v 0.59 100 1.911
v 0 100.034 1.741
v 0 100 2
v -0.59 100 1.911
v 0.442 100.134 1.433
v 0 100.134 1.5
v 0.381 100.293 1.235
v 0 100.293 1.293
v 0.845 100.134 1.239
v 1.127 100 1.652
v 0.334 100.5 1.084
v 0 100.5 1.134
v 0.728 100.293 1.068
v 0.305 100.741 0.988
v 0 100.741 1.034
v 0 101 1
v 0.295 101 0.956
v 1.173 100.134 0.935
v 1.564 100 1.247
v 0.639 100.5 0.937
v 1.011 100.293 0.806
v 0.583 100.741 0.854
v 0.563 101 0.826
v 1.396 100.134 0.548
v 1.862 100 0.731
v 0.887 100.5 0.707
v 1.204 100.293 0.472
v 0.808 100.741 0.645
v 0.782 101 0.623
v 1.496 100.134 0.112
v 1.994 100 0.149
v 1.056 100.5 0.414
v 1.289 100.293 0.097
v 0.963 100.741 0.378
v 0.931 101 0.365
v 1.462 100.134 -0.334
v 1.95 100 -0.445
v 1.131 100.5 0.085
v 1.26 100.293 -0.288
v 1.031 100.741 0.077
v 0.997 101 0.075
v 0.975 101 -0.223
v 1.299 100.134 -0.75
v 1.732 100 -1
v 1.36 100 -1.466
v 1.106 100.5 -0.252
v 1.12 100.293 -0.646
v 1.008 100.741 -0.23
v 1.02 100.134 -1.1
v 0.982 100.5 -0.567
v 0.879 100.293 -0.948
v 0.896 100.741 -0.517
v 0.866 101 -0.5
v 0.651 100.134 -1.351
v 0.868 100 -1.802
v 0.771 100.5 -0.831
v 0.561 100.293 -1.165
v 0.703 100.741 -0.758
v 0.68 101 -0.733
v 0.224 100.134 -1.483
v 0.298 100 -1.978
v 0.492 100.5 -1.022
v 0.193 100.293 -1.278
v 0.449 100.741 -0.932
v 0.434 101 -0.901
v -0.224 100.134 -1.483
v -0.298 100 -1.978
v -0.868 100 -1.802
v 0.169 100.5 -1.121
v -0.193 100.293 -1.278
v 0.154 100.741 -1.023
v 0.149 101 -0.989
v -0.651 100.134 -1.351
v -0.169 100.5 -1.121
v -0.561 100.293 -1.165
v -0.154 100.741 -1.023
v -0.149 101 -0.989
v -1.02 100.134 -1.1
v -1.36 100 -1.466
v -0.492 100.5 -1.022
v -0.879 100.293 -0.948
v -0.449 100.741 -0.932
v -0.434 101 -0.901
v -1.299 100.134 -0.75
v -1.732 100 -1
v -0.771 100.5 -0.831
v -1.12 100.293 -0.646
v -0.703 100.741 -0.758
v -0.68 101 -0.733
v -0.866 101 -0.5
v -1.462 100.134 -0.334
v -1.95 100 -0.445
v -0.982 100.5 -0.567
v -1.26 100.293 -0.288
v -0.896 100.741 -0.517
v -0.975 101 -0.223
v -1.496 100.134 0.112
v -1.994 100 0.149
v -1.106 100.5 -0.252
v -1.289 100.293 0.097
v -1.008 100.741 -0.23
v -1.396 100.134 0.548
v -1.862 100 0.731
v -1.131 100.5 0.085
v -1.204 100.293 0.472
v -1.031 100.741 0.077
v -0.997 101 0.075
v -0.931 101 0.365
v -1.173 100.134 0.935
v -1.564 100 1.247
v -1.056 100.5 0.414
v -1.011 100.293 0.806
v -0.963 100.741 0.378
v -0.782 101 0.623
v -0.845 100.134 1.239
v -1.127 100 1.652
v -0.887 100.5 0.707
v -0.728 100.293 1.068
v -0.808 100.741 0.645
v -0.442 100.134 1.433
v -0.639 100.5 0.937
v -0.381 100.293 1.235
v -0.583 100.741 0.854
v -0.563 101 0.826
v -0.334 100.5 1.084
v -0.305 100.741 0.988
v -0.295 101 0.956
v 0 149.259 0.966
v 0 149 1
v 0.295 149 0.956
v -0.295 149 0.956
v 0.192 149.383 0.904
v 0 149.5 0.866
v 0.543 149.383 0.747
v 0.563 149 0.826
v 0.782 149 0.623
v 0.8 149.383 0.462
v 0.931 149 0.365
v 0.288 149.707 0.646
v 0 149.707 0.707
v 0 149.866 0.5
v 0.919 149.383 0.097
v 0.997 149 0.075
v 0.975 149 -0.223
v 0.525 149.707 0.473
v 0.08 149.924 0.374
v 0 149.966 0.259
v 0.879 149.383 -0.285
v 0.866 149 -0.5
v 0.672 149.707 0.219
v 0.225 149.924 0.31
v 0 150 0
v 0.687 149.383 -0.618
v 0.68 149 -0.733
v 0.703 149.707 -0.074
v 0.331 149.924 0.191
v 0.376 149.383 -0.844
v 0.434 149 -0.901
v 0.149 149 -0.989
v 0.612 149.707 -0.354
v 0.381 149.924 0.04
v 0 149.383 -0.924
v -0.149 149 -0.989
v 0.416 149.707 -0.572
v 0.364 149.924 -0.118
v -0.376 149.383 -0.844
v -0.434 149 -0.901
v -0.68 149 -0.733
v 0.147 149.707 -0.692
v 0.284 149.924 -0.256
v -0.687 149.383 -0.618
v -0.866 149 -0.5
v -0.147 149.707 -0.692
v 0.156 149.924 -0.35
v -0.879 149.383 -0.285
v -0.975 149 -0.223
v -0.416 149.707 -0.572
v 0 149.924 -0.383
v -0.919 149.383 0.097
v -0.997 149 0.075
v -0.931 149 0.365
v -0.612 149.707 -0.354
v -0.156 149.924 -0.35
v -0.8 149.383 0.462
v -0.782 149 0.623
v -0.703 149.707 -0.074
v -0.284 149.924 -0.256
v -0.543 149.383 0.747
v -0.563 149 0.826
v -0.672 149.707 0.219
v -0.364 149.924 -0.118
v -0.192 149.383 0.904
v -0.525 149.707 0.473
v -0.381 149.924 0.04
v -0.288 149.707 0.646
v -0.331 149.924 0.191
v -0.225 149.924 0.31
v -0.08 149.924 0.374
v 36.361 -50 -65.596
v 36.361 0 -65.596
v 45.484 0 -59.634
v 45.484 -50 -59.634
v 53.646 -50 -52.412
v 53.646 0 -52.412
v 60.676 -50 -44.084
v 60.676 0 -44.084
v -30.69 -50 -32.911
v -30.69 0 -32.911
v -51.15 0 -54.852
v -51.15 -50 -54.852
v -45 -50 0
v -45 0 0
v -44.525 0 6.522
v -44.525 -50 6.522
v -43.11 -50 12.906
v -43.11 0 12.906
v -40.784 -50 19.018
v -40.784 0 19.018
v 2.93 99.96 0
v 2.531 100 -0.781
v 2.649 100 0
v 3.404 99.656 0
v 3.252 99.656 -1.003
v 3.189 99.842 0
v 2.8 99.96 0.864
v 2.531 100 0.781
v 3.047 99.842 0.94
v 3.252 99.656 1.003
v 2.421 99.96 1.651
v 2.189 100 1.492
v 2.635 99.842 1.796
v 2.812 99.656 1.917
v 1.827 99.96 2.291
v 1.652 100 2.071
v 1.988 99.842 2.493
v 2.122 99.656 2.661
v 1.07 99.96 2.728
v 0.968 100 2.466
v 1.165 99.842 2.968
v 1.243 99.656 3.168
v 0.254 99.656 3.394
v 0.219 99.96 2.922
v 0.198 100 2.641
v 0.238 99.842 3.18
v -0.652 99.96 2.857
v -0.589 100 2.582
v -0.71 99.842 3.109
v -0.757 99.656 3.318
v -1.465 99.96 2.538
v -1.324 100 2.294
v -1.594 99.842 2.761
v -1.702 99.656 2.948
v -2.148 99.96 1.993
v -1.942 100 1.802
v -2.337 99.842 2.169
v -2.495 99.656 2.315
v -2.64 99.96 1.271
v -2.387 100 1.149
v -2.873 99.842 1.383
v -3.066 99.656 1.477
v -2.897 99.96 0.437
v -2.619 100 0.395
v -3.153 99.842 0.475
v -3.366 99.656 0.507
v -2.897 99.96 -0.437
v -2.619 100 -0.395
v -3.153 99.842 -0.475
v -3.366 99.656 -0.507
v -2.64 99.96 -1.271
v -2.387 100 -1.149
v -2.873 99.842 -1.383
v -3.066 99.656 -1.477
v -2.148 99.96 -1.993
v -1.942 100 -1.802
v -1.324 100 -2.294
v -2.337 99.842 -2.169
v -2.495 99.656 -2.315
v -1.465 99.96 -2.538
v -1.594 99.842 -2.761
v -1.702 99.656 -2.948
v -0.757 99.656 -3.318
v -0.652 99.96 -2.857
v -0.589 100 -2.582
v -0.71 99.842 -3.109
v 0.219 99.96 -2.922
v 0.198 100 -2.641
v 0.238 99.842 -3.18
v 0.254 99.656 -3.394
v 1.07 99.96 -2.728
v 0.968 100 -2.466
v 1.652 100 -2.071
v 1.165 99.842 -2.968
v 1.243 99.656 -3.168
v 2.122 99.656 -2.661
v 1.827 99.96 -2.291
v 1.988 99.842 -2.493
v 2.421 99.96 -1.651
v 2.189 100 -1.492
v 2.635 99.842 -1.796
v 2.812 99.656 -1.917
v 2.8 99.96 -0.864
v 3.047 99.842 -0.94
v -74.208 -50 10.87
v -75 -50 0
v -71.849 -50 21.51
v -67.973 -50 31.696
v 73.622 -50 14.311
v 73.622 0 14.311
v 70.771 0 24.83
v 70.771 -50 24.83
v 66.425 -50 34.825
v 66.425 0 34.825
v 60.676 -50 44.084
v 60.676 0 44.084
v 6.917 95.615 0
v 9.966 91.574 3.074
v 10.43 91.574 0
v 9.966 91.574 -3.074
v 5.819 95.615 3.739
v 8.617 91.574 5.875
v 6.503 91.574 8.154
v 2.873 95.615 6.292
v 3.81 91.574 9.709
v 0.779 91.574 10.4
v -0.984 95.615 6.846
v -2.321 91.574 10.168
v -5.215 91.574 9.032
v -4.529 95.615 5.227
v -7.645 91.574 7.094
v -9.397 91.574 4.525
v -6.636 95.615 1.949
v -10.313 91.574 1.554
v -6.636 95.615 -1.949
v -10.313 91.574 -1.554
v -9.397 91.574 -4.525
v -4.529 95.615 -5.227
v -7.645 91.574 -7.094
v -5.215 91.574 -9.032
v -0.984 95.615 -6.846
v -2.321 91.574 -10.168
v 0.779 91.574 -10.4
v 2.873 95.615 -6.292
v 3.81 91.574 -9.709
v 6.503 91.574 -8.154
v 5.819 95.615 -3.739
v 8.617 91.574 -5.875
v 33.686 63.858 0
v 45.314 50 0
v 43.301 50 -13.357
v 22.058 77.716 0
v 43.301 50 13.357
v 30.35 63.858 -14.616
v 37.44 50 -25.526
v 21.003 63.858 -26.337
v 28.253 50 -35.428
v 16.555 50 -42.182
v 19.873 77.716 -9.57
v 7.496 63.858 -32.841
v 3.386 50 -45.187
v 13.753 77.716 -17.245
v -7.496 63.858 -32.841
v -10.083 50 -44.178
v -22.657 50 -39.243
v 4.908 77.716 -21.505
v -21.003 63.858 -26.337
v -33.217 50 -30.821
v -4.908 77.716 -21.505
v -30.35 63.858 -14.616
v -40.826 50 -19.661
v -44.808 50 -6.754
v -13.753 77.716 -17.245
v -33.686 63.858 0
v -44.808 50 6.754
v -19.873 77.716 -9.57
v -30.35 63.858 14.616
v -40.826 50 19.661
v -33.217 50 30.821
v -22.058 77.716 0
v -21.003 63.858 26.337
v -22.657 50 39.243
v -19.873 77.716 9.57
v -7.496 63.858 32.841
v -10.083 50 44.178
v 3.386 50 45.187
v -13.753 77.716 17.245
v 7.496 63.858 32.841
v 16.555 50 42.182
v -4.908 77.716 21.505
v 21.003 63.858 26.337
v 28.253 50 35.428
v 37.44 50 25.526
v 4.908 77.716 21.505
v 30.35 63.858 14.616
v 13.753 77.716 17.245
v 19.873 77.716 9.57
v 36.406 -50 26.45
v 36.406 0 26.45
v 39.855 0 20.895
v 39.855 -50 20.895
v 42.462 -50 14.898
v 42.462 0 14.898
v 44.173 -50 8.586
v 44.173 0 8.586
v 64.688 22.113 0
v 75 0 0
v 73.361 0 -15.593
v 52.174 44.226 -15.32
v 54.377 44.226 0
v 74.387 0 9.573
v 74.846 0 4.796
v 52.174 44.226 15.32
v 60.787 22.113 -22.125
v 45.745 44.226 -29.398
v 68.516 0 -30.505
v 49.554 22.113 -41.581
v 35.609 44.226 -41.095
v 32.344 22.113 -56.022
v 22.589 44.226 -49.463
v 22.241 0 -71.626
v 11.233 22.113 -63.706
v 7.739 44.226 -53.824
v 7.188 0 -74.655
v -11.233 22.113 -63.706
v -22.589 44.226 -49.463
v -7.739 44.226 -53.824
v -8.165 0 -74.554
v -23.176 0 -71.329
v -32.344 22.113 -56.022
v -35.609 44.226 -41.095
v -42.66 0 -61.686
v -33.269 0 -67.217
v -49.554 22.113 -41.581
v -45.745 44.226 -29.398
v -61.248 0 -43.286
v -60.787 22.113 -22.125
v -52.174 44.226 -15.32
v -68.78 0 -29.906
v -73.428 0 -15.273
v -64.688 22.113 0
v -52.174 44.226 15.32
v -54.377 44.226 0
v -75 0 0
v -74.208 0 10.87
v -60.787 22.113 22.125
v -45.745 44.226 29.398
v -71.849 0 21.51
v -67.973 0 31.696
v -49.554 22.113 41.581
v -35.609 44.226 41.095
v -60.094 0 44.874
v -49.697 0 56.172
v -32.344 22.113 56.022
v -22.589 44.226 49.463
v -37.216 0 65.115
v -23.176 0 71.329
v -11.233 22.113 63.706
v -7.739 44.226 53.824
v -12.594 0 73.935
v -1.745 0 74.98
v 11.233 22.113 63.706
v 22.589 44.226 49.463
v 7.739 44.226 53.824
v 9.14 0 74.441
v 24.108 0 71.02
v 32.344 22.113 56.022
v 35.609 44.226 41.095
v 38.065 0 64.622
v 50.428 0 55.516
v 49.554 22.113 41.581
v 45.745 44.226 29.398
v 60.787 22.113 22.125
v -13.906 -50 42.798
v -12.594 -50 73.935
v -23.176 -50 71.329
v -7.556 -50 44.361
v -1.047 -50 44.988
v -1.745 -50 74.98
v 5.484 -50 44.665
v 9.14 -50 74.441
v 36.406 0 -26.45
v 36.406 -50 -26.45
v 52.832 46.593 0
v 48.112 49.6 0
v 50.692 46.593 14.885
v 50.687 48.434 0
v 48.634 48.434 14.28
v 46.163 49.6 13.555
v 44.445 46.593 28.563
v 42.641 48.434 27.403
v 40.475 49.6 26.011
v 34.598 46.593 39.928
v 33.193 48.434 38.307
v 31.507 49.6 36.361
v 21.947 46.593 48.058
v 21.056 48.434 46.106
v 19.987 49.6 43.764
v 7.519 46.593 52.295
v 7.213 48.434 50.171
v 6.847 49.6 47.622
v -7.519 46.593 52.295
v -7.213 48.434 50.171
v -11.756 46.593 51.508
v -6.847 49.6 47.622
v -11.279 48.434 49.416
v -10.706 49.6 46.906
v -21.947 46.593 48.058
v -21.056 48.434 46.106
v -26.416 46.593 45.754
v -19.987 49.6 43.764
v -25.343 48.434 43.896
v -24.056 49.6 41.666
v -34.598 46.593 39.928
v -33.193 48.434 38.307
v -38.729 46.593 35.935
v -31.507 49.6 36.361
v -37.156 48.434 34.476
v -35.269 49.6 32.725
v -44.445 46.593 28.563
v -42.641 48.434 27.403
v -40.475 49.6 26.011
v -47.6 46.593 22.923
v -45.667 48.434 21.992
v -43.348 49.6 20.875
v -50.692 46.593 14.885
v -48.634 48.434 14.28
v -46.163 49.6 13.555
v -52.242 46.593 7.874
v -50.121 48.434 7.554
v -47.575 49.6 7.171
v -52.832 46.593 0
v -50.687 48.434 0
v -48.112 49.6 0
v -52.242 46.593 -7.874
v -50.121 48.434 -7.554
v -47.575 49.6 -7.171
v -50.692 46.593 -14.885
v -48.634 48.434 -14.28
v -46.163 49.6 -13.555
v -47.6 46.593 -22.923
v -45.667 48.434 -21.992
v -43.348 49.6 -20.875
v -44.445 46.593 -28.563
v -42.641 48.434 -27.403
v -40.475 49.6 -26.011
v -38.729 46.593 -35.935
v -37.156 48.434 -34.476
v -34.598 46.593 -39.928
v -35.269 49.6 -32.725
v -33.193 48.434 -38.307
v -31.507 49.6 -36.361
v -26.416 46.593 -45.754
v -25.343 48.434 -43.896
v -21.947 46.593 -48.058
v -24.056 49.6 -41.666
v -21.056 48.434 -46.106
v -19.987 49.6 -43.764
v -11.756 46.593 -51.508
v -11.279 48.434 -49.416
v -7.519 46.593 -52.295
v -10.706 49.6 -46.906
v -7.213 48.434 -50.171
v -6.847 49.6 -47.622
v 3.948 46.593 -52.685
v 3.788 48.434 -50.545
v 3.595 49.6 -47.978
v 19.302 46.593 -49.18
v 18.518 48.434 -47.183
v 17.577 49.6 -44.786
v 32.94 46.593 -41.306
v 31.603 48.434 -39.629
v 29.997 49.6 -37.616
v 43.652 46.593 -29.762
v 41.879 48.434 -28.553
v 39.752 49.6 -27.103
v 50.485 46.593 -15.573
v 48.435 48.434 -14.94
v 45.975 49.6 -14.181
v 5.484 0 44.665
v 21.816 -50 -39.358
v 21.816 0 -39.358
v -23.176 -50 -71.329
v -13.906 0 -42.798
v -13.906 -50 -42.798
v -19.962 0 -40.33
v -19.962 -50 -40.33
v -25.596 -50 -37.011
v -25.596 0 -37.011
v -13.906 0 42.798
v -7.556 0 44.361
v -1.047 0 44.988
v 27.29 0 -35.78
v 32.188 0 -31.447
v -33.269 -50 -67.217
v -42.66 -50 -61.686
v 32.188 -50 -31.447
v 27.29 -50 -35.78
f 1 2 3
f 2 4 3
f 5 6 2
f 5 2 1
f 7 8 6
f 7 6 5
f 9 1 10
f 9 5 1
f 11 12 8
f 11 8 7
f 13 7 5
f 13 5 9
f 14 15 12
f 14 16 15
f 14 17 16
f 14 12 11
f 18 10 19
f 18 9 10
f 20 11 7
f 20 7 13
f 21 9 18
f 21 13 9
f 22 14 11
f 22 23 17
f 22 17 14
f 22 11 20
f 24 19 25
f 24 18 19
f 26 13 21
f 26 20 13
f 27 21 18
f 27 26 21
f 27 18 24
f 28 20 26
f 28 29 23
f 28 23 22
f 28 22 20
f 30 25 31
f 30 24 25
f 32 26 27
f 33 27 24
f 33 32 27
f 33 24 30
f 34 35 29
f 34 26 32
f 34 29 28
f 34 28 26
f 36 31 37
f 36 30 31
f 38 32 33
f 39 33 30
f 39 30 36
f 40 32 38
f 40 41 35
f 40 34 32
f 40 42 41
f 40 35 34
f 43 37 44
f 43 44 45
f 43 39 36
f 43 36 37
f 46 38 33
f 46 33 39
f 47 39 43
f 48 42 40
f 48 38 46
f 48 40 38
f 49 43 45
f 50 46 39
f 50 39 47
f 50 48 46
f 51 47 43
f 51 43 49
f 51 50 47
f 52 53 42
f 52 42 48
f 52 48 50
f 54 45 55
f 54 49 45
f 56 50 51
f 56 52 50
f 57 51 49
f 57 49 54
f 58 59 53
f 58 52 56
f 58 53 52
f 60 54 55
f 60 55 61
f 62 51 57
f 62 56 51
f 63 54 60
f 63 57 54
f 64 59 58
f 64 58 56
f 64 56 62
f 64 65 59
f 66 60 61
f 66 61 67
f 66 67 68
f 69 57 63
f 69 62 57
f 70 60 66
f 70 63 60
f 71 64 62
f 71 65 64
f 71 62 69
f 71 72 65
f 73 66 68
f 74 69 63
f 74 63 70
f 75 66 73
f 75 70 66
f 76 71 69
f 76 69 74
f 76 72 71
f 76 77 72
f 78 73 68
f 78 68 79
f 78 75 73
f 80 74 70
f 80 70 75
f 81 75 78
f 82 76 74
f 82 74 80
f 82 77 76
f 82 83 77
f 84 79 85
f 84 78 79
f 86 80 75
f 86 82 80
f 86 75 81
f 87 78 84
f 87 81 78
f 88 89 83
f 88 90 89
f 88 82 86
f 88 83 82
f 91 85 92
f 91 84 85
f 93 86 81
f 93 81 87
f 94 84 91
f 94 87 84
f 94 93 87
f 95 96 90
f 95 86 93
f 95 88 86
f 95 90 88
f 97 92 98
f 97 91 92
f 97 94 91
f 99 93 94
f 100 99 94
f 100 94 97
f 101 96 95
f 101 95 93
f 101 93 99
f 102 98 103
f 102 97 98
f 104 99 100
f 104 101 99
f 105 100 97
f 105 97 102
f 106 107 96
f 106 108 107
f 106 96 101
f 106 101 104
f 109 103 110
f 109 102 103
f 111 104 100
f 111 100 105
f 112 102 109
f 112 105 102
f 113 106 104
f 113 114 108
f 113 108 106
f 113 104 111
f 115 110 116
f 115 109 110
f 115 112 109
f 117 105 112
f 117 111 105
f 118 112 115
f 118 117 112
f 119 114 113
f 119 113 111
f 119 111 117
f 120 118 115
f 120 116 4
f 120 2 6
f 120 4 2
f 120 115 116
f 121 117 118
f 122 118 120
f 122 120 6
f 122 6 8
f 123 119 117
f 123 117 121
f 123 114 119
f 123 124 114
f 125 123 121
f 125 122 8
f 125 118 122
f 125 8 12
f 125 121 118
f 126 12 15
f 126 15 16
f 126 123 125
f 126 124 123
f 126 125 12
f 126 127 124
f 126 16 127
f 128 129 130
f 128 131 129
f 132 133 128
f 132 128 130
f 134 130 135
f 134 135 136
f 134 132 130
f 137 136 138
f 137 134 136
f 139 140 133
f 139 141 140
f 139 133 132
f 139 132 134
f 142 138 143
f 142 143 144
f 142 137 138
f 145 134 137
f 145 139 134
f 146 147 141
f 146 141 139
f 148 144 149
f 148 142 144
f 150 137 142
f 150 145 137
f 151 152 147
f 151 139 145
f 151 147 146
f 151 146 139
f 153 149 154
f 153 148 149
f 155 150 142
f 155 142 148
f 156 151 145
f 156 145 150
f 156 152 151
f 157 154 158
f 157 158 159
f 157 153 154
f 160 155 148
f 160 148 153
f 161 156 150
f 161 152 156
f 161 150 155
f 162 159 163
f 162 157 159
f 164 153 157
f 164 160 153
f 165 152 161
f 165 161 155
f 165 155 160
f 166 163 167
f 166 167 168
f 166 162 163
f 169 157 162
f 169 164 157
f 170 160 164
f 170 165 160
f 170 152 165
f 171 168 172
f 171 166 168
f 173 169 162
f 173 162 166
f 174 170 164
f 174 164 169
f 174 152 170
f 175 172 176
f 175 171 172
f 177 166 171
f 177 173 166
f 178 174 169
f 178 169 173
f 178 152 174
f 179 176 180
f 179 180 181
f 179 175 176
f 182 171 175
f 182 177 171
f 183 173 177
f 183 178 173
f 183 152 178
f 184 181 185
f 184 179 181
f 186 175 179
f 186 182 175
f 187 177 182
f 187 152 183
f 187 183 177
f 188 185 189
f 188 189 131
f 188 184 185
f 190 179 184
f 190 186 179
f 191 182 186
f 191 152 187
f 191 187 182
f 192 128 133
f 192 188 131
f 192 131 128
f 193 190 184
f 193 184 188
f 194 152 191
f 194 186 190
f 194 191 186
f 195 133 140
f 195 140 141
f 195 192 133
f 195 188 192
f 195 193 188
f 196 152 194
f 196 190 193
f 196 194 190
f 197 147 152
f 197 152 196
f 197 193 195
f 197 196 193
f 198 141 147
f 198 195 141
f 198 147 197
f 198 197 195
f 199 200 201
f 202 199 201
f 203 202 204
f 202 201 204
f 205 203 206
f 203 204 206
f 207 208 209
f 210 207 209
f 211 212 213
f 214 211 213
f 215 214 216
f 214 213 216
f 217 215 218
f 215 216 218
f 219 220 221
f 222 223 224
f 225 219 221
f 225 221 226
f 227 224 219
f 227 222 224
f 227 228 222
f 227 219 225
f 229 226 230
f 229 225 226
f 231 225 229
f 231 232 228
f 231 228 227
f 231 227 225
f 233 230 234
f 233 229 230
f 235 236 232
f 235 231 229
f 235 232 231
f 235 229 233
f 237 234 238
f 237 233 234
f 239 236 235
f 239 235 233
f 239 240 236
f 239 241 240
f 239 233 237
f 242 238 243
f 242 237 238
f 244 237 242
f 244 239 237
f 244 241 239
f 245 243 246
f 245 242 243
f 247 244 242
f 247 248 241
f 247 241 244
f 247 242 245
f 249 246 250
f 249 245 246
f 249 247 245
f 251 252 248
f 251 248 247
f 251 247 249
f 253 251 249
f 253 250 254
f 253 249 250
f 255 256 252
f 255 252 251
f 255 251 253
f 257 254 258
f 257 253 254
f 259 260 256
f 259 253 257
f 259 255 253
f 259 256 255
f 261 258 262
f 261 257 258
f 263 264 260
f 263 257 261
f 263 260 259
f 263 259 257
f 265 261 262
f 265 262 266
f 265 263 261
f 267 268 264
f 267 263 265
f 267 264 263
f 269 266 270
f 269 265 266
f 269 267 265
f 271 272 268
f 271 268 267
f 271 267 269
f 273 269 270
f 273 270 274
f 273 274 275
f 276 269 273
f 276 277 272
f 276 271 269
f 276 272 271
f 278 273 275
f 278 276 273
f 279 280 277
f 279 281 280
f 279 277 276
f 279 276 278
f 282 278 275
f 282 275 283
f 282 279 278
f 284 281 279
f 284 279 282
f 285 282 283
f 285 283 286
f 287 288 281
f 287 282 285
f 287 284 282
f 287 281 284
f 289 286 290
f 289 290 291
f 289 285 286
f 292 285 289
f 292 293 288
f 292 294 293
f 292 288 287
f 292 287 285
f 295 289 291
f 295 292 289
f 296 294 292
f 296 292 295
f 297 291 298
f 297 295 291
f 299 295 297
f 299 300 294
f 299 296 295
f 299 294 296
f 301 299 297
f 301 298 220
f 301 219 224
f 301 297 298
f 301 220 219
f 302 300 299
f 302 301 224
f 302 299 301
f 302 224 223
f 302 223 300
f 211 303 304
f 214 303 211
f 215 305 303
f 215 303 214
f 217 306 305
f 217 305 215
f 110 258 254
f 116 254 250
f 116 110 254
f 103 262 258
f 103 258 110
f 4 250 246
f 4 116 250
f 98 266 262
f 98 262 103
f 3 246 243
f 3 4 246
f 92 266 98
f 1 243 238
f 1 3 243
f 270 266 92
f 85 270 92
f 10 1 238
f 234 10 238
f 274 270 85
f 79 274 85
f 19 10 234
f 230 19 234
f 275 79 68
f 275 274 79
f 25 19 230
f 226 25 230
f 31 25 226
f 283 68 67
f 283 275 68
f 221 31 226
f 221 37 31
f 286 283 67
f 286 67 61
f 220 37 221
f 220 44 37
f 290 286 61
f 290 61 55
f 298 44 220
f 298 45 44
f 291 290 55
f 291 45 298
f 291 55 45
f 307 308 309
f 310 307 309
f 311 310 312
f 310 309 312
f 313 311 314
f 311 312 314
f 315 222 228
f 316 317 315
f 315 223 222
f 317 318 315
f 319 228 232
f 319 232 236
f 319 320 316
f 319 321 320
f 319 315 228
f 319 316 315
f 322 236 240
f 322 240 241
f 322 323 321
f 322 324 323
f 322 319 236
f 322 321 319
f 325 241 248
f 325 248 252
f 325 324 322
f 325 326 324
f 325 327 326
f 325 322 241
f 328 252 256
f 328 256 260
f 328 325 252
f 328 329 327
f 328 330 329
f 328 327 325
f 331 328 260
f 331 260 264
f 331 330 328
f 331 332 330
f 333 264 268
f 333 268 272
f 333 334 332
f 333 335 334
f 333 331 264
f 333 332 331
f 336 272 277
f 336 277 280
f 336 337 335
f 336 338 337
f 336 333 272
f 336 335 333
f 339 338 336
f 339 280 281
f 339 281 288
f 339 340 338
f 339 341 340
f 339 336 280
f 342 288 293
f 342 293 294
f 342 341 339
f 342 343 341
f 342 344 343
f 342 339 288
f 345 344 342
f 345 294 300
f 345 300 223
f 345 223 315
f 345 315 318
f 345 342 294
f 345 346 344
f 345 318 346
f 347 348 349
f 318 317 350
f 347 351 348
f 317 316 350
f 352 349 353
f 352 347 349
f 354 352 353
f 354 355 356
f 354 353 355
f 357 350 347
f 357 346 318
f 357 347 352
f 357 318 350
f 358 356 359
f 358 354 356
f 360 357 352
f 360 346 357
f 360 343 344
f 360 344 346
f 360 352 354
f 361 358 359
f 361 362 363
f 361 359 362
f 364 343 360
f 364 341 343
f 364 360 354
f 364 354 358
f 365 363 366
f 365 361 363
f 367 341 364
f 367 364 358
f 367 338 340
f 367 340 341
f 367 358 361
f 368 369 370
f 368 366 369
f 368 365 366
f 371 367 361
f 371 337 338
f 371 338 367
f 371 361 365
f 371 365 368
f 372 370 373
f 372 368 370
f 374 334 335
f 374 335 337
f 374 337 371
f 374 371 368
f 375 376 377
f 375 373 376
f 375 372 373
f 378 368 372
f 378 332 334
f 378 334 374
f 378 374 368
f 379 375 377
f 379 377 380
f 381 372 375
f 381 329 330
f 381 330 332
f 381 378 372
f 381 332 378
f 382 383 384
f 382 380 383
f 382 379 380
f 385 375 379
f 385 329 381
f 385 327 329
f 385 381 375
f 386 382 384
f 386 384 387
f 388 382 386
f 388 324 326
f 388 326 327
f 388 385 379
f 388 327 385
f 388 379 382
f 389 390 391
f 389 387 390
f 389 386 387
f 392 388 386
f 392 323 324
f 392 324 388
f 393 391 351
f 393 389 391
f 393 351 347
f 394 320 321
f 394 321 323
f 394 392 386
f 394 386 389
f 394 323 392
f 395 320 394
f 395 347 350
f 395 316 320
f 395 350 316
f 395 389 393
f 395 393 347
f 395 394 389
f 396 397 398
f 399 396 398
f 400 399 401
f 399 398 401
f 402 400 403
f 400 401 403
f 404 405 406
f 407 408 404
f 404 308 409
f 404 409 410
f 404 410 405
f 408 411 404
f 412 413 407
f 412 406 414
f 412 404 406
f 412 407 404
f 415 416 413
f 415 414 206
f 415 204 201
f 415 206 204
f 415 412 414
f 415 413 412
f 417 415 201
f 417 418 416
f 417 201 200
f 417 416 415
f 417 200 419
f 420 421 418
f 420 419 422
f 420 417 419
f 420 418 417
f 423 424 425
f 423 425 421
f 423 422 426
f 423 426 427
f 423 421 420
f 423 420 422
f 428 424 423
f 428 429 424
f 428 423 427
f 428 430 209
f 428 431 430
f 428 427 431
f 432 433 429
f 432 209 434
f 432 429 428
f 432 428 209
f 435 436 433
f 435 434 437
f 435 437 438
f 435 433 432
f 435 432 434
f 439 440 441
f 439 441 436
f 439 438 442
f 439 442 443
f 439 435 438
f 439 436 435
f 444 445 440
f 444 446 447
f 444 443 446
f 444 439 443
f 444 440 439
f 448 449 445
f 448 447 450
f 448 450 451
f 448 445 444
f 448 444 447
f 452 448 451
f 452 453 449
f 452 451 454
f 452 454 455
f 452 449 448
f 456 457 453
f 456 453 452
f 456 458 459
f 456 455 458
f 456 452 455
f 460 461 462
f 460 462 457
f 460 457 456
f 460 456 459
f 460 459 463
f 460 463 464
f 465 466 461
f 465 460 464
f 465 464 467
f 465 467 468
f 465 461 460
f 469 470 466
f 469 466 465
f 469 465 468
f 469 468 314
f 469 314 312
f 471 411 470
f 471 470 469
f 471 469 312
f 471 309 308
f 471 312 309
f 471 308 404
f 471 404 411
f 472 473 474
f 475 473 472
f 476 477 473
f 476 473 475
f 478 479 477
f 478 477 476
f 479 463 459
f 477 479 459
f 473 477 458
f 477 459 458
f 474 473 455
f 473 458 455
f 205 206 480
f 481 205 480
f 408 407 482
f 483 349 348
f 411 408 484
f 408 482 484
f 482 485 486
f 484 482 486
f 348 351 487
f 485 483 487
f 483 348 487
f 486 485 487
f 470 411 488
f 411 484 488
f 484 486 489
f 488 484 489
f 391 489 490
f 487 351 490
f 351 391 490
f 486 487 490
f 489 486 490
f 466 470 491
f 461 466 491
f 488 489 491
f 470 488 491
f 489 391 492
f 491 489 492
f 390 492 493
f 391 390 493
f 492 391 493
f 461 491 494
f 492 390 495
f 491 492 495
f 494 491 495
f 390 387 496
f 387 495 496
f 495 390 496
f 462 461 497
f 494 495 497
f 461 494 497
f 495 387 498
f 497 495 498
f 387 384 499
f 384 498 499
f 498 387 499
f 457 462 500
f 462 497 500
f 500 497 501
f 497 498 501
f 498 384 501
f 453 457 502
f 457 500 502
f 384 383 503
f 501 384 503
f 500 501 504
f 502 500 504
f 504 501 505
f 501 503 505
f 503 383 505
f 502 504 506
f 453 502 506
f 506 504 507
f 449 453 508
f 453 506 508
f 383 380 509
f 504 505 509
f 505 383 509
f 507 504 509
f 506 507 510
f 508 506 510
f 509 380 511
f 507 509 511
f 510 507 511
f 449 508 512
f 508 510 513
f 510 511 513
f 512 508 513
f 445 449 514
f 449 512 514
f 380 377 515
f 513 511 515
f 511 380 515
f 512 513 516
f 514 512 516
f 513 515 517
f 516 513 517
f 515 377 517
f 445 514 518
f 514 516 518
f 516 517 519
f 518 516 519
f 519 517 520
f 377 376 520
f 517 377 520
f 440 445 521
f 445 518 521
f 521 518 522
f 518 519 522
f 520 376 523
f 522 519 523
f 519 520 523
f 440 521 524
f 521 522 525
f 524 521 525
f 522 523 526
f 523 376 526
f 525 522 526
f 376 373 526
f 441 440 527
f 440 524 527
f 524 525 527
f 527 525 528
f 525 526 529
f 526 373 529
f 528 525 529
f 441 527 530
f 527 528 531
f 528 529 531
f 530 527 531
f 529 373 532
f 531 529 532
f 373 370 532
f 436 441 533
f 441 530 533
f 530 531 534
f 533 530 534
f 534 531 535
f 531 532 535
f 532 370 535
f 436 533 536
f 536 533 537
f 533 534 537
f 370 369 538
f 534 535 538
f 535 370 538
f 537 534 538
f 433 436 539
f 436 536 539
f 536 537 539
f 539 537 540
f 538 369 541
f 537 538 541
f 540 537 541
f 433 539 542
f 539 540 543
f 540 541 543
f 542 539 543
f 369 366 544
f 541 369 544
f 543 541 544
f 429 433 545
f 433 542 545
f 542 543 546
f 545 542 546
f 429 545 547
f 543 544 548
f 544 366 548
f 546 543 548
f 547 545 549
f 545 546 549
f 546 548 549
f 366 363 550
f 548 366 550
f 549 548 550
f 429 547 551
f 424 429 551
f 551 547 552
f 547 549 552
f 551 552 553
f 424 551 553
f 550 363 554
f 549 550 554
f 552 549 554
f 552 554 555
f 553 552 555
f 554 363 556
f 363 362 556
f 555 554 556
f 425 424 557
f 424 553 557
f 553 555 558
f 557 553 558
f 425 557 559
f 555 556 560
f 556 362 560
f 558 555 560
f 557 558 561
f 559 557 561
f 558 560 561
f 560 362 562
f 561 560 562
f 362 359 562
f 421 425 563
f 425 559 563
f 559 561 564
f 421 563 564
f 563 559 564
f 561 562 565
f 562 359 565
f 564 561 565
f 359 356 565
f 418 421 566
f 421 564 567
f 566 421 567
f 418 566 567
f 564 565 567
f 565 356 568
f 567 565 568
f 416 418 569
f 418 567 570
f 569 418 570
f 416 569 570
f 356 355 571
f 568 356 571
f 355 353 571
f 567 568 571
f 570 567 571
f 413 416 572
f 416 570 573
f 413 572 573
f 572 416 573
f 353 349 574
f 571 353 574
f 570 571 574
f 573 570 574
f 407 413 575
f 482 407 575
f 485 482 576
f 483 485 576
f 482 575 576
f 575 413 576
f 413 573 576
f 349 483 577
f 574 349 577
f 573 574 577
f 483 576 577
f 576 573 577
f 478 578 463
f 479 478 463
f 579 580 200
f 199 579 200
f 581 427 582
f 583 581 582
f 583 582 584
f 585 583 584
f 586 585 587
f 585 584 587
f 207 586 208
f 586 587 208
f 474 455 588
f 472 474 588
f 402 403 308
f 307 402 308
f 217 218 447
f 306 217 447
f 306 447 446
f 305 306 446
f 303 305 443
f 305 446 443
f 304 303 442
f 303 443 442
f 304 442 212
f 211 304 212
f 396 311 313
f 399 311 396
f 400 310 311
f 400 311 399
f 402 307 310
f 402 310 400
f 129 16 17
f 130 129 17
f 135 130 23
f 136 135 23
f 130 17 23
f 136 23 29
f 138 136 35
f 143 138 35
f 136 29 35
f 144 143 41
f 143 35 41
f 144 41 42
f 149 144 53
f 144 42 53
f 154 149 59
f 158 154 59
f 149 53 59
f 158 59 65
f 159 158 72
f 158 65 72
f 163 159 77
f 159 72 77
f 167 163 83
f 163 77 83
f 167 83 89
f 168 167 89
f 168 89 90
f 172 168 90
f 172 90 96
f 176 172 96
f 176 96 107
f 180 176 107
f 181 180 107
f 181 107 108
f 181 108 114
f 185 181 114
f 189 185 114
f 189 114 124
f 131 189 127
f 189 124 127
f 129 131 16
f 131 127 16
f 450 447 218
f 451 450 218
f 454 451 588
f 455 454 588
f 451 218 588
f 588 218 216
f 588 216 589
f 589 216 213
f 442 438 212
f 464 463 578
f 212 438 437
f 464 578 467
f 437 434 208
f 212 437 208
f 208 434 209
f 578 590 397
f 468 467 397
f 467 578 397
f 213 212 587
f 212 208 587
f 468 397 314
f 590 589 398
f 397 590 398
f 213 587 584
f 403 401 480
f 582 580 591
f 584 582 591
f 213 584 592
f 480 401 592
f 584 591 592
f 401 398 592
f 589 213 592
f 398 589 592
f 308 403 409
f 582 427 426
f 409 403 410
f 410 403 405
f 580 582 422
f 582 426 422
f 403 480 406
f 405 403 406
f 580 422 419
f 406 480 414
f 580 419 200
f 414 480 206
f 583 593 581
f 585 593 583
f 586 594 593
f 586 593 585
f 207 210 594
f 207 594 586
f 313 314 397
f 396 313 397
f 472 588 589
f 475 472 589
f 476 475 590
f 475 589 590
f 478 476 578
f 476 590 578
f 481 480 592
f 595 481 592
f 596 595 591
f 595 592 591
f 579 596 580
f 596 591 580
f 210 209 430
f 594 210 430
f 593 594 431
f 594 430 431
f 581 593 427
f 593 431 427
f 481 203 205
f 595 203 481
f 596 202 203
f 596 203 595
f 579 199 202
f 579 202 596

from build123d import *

# Parameters (mm, degrees)
PROFIL_BASE_R                = 75
BASE_DEPTH                   = 50
BASE_TAPER                   = 25
CONG_1_R                     = 10
PIED_DEPTH                   = 50
R_P_TITION_CIRCULAIRE1_COUNT = 5
ESQUISSE3_R                  = 45.313914484
BOSS_EXTRU_3_DEPTH           = 50
BOSS_EXTRU_3_TAPER           = 40
ESQUISSE5_R                  = 1
BOSS_EXTRU_4_DEPTH           = 50
CONG_2_R                     = 1
CHANFREIN1_SIZE              = 0.254371318
CHANFREIN1_SIZE_2            = 11
CONG_3_R                     = 1
CONG_4_R                     = 1


with BuildPart() as part:
    # profil Base → Base (new body)
    with BuildSketch(Plane(origin=(0, 0, 0), x_dir=(1, 0, 0), z_dir=(0, 1, 0))):
        Circle(PROFIL_BASE_R)
    extrude(amount=BASE_DEPTH, taper=BASE_TAPER)

    # Congé1
    cong_1_edges = [part.edges().sort_by_distance(p)[0] for p in [
        (-51.684617092, 50, 0),
    ]]
    fillet(cong_1_edges, radius=CONG_1_R)

    # Profil Pied → Pied (add)
    with BuildSketch(Plane.XZ):
        with BuildLine():
            Line((-75, 0), (-45, 0))
            ThreePointArc((-45, 0), (-43.93332032, 9.739782627), (-40.783850417, 19.017821778))
            Line((-40.783850417, 19.017821778), (-67.973084028, 31.696369631))
            ThreePointArc((-67.973084028, 31.696369631), (-73.222200534, 16.232971045), (-75, 0))
        make_face()
    pied = extrude(amount=PIED_DEPTH)

    # Répétition circulaire1: Pied ×5 about axis
    r_p_tition_circulaire1_axis = Axis((0, 0, 0), (0, 1, 0))
    for i in range(1, R_P_TITION_CIRCULAIRE1_COUNT):
        add(pied.rotate(r_p_tition_circulaire1_axis, i * 360 / R_P_TITION_CIRCULAIRE1_COUNT))

    # Esquisse3 → Boss.-Extru.3 (add)
    with BuildSketch(Plane(origin=(0, 50, 0), x_dir=(1, 0, 0), z_dir=(0, 1, 0))):
        Circle(ESQUISSE3_R)
    extrude(amount=BOSS_EXTRU_3_DEPTH, taper=BOSS_EXTRU_3_TAPER)

    # Esquisse5 → Boss.-Extru.4 (add)
    with BuildSketch(Plane(origin=(0, 100, 0), x_dir=(1, 0, 0), z_dir=(0, 1, 0))):
        with Locations(Location((0, 0, 0), (0, 0, 270))):
            Circle(ESQUISSE5_R)
    extrude(amount=BOSS_EXTRU_4_DEPTH)

    # Congé2
    cong_2_edges = [part.edges().sort_by_distance(p)[0] for p in [
        (0, 150, -1),
    ]]
    fillet(cong_2_edges, radius=CONG_2_R)

    # Chanfrein1
    # the kernel refuses this chamfer: 11, 0.254371318 mm, written as the material it takes off along each edge
    with BuildSketch(Plane(origin=(0, 100, 0), x_dir=(1, 0, 0), z_dir=(0, 0, -1))) as chanfrein1_piece_1:
        Polygon((3.358932925 - CHANFREIN1_SIZE, 0), (3.358932925 + CHANFREIN1_SIZE_2 * 0.642787609687, CHANFREIN1_SIZE_2 * 0.766044443119), (3.358932925, 0), align=None)
    revolve(axis=Axis((0, 100, 0), (0, -1, 0)), mode=Mode.SUBTRACT)

    # Congé3
    cong_3_edges = [part.edges().sort_by_distance(p)[0] for p in [
        (-3.104561607, 100, 0),
    ]]
    fillet(cong_3_edges, radius=CONG_3_R)

    # Congé4
    cong_4_edges = [part.edges().sort_by_distance(p)[0] for p in [
        (0, 100, -1),
    ]]
    fillet(cong_4_edges, radius=CONG_4_R)


solid = part.part
